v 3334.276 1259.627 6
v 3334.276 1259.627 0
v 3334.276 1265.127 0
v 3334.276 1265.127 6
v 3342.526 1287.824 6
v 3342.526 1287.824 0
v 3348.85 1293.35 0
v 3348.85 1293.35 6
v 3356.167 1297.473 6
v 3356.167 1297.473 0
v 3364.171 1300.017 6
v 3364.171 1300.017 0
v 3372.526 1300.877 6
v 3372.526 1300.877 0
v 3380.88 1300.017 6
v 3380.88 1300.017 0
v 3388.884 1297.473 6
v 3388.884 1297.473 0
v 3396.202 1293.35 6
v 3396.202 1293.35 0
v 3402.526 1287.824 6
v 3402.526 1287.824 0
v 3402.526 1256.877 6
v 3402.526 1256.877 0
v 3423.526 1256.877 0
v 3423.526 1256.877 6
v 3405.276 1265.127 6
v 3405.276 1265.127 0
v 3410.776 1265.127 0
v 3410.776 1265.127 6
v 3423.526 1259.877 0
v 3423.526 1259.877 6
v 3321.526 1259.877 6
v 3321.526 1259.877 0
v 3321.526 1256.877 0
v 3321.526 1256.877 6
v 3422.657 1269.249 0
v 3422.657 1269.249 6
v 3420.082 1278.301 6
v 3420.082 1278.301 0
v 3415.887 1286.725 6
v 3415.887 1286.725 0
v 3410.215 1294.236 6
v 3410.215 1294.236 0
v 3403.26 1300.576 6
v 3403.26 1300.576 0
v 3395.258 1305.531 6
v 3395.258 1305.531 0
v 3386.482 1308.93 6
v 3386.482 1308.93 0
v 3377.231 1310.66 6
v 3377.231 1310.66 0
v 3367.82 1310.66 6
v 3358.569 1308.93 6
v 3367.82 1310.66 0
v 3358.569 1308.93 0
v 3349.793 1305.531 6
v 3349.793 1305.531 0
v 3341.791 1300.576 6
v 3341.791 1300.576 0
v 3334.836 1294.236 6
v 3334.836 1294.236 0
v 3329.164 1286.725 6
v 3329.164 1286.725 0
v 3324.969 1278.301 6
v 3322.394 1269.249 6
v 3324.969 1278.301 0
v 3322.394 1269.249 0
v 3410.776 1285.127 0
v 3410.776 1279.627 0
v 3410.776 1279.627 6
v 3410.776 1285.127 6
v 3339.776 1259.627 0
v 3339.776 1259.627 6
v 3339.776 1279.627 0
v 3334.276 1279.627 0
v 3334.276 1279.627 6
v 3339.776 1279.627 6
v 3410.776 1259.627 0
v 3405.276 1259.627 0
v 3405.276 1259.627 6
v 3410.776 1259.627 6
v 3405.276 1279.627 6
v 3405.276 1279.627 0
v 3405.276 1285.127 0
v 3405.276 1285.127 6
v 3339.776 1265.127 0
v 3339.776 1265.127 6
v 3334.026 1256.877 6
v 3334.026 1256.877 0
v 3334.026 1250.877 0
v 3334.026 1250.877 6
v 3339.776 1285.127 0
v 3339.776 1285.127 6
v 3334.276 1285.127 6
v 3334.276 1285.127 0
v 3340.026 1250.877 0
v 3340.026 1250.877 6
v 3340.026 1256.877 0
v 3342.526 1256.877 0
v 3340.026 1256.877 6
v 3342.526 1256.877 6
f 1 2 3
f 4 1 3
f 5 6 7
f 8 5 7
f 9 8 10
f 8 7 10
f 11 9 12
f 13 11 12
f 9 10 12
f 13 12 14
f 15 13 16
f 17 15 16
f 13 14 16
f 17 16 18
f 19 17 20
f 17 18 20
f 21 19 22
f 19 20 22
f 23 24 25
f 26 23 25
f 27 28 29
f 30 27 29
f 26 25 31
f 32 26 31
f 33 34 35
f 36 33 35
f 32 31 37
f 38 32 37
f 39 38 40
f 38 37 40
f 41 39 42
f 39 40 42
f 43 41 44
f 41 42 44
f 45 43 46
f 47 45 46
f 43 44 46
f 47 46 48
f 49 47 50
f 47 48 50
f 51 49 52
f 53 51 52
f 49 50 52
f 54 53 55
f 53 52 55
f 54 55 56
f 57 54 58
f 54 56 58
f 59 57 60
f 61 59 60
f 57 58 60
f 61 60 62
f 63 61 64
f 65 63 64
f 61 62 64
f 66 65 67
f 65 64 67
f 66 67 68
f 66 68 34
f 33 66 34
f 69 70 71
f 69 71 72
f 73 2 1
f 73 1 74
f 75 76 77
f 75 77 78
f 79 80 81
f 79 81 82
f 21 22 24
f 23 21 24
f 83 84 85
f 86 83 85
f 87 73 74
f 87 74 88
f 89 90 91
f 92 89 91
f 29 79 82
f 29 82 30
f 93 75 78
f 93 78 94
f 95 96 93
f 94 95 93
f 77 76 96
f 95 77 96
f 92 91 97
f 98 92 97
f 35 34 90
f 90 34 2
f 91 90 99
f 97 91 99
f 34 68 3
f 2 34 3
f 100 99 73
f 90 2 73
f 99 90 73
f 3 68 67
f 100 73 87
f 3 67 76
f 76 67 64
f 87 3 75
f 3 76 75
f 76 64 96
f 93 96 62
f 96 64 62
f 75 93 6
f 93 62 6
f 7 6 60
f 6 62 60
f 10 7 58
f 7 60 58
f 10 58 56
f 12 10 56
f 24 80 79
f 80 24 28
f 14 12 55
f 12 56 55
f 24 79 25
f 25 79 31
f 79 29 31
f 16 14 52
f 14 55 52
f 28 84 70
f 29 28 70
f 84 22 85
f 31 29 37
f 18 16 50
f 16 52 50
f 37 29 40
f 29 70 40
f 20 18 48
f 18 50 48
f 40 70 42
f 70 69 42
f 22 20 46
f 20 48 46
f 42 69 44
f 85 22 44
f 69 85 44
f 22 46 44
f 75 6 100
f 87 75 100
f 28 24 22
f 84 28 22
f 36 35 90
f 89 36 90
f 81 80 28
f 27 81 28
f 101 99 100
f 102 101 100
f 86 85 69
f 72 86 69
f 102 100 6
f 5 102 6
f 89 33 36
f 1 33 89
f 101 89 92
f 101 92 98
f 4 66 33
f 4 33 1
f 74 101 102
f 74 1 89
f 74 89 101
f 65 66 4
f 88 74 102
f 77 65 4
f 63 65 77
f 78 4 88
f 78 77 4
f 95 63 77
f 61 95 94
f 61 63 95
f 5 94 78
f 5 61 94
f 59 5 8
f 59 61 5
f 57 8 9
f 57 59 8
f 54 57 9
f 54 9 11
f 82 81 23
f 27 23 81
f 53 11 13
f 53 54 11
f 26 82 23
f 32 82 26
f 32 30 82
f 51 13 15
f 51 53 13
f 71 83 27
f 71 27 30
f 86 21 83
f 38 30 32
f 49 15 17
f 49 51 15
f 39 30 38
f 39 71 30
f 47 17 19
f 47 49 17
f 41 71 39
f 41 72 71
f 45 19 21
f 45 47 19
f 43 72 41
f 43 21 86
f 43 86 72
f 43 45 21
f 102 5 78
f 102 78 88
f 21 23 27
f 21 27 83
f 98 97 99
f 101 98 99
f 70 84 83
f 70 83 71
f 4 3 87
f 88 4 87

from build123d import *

# Parameters (mm, degrees)
MODEL_W             = 5.5
MODEL_H             = 5.5
BOSS_EXTRUDE1_DEPTH = 6


with BuildPart() as part:
    # Model → Boss-Extrude1 (new body)
    with BuildSketch(Plane.XY):
        with BuildLine():
            Line((3321.525540583, 1259.877349699), (3321.525540583, 1256.877349699))
            Line((3321.525540583, 1256.877349699), (3334.025540583, 1256.877349699))
            Line((3334.025540583, 1256.877349699), (3334.025540583, 1250.877349699))
            Line((3334.025540583, 1250.877349699), (3340.025540583, 1250.877349699))
            Line((3340.025540583, 1250.877349699), (3340.025540583, 1256.877349699))
            Line((3340.025540583, 1256.877349699), (3342.525540583, 1256.877349699))
            Line((3342.525540583, 1256.877349699), (3342.525540583, 1287.823726924))
            ThreePointArc((3342.525540583, 1287.823726924), (3372.525540583, 1300.877349699), (3402.525540583, 1287.823726924))
            Line((3402.525540583, 1287.823726924), (3402.525540583, 1256.877349699))
            Line((3402.525540583, 1256.877349699), (3413.525540583, 1256.877349699))
            Line((3413.525540583, 1256.877349699), (3423.525540583, 1256.877349699))
            Line((3423.525540583, 1256.877349699), (3423.525540583, 1259.877349699))
            ThreePointArc((3423.525540583, 1259.877349699), (3372.525540583, 1310.877349699), (3321.525540583, 1259.877349699))
        make_face()
        with Locations((3408.025540583, 1262.377349699)):
            Rectangle(MODEL_W, MODEL_H, mode=Mode.SUBTRACT)
        with Locations((3408.025540583, 1282.377349699)):
            Rectangle(MODEL_W, MODEL_H, mode=Mode.SUBTRACT)
        with Locations((3337.025540583, 1262.377349699)):
            Rectangle(MODEL_W, MODEL_H, mode=Mode.SUBTRACT)
        with Locations((3337.025540583, 1282.377349699)):
            Rectangle(MODEL_W, MODEL_H, mode=Mode.SUBTRACT)
    extrude(amount=BOSS_EXTRUDE1_DEPTH)


solid = part.part
